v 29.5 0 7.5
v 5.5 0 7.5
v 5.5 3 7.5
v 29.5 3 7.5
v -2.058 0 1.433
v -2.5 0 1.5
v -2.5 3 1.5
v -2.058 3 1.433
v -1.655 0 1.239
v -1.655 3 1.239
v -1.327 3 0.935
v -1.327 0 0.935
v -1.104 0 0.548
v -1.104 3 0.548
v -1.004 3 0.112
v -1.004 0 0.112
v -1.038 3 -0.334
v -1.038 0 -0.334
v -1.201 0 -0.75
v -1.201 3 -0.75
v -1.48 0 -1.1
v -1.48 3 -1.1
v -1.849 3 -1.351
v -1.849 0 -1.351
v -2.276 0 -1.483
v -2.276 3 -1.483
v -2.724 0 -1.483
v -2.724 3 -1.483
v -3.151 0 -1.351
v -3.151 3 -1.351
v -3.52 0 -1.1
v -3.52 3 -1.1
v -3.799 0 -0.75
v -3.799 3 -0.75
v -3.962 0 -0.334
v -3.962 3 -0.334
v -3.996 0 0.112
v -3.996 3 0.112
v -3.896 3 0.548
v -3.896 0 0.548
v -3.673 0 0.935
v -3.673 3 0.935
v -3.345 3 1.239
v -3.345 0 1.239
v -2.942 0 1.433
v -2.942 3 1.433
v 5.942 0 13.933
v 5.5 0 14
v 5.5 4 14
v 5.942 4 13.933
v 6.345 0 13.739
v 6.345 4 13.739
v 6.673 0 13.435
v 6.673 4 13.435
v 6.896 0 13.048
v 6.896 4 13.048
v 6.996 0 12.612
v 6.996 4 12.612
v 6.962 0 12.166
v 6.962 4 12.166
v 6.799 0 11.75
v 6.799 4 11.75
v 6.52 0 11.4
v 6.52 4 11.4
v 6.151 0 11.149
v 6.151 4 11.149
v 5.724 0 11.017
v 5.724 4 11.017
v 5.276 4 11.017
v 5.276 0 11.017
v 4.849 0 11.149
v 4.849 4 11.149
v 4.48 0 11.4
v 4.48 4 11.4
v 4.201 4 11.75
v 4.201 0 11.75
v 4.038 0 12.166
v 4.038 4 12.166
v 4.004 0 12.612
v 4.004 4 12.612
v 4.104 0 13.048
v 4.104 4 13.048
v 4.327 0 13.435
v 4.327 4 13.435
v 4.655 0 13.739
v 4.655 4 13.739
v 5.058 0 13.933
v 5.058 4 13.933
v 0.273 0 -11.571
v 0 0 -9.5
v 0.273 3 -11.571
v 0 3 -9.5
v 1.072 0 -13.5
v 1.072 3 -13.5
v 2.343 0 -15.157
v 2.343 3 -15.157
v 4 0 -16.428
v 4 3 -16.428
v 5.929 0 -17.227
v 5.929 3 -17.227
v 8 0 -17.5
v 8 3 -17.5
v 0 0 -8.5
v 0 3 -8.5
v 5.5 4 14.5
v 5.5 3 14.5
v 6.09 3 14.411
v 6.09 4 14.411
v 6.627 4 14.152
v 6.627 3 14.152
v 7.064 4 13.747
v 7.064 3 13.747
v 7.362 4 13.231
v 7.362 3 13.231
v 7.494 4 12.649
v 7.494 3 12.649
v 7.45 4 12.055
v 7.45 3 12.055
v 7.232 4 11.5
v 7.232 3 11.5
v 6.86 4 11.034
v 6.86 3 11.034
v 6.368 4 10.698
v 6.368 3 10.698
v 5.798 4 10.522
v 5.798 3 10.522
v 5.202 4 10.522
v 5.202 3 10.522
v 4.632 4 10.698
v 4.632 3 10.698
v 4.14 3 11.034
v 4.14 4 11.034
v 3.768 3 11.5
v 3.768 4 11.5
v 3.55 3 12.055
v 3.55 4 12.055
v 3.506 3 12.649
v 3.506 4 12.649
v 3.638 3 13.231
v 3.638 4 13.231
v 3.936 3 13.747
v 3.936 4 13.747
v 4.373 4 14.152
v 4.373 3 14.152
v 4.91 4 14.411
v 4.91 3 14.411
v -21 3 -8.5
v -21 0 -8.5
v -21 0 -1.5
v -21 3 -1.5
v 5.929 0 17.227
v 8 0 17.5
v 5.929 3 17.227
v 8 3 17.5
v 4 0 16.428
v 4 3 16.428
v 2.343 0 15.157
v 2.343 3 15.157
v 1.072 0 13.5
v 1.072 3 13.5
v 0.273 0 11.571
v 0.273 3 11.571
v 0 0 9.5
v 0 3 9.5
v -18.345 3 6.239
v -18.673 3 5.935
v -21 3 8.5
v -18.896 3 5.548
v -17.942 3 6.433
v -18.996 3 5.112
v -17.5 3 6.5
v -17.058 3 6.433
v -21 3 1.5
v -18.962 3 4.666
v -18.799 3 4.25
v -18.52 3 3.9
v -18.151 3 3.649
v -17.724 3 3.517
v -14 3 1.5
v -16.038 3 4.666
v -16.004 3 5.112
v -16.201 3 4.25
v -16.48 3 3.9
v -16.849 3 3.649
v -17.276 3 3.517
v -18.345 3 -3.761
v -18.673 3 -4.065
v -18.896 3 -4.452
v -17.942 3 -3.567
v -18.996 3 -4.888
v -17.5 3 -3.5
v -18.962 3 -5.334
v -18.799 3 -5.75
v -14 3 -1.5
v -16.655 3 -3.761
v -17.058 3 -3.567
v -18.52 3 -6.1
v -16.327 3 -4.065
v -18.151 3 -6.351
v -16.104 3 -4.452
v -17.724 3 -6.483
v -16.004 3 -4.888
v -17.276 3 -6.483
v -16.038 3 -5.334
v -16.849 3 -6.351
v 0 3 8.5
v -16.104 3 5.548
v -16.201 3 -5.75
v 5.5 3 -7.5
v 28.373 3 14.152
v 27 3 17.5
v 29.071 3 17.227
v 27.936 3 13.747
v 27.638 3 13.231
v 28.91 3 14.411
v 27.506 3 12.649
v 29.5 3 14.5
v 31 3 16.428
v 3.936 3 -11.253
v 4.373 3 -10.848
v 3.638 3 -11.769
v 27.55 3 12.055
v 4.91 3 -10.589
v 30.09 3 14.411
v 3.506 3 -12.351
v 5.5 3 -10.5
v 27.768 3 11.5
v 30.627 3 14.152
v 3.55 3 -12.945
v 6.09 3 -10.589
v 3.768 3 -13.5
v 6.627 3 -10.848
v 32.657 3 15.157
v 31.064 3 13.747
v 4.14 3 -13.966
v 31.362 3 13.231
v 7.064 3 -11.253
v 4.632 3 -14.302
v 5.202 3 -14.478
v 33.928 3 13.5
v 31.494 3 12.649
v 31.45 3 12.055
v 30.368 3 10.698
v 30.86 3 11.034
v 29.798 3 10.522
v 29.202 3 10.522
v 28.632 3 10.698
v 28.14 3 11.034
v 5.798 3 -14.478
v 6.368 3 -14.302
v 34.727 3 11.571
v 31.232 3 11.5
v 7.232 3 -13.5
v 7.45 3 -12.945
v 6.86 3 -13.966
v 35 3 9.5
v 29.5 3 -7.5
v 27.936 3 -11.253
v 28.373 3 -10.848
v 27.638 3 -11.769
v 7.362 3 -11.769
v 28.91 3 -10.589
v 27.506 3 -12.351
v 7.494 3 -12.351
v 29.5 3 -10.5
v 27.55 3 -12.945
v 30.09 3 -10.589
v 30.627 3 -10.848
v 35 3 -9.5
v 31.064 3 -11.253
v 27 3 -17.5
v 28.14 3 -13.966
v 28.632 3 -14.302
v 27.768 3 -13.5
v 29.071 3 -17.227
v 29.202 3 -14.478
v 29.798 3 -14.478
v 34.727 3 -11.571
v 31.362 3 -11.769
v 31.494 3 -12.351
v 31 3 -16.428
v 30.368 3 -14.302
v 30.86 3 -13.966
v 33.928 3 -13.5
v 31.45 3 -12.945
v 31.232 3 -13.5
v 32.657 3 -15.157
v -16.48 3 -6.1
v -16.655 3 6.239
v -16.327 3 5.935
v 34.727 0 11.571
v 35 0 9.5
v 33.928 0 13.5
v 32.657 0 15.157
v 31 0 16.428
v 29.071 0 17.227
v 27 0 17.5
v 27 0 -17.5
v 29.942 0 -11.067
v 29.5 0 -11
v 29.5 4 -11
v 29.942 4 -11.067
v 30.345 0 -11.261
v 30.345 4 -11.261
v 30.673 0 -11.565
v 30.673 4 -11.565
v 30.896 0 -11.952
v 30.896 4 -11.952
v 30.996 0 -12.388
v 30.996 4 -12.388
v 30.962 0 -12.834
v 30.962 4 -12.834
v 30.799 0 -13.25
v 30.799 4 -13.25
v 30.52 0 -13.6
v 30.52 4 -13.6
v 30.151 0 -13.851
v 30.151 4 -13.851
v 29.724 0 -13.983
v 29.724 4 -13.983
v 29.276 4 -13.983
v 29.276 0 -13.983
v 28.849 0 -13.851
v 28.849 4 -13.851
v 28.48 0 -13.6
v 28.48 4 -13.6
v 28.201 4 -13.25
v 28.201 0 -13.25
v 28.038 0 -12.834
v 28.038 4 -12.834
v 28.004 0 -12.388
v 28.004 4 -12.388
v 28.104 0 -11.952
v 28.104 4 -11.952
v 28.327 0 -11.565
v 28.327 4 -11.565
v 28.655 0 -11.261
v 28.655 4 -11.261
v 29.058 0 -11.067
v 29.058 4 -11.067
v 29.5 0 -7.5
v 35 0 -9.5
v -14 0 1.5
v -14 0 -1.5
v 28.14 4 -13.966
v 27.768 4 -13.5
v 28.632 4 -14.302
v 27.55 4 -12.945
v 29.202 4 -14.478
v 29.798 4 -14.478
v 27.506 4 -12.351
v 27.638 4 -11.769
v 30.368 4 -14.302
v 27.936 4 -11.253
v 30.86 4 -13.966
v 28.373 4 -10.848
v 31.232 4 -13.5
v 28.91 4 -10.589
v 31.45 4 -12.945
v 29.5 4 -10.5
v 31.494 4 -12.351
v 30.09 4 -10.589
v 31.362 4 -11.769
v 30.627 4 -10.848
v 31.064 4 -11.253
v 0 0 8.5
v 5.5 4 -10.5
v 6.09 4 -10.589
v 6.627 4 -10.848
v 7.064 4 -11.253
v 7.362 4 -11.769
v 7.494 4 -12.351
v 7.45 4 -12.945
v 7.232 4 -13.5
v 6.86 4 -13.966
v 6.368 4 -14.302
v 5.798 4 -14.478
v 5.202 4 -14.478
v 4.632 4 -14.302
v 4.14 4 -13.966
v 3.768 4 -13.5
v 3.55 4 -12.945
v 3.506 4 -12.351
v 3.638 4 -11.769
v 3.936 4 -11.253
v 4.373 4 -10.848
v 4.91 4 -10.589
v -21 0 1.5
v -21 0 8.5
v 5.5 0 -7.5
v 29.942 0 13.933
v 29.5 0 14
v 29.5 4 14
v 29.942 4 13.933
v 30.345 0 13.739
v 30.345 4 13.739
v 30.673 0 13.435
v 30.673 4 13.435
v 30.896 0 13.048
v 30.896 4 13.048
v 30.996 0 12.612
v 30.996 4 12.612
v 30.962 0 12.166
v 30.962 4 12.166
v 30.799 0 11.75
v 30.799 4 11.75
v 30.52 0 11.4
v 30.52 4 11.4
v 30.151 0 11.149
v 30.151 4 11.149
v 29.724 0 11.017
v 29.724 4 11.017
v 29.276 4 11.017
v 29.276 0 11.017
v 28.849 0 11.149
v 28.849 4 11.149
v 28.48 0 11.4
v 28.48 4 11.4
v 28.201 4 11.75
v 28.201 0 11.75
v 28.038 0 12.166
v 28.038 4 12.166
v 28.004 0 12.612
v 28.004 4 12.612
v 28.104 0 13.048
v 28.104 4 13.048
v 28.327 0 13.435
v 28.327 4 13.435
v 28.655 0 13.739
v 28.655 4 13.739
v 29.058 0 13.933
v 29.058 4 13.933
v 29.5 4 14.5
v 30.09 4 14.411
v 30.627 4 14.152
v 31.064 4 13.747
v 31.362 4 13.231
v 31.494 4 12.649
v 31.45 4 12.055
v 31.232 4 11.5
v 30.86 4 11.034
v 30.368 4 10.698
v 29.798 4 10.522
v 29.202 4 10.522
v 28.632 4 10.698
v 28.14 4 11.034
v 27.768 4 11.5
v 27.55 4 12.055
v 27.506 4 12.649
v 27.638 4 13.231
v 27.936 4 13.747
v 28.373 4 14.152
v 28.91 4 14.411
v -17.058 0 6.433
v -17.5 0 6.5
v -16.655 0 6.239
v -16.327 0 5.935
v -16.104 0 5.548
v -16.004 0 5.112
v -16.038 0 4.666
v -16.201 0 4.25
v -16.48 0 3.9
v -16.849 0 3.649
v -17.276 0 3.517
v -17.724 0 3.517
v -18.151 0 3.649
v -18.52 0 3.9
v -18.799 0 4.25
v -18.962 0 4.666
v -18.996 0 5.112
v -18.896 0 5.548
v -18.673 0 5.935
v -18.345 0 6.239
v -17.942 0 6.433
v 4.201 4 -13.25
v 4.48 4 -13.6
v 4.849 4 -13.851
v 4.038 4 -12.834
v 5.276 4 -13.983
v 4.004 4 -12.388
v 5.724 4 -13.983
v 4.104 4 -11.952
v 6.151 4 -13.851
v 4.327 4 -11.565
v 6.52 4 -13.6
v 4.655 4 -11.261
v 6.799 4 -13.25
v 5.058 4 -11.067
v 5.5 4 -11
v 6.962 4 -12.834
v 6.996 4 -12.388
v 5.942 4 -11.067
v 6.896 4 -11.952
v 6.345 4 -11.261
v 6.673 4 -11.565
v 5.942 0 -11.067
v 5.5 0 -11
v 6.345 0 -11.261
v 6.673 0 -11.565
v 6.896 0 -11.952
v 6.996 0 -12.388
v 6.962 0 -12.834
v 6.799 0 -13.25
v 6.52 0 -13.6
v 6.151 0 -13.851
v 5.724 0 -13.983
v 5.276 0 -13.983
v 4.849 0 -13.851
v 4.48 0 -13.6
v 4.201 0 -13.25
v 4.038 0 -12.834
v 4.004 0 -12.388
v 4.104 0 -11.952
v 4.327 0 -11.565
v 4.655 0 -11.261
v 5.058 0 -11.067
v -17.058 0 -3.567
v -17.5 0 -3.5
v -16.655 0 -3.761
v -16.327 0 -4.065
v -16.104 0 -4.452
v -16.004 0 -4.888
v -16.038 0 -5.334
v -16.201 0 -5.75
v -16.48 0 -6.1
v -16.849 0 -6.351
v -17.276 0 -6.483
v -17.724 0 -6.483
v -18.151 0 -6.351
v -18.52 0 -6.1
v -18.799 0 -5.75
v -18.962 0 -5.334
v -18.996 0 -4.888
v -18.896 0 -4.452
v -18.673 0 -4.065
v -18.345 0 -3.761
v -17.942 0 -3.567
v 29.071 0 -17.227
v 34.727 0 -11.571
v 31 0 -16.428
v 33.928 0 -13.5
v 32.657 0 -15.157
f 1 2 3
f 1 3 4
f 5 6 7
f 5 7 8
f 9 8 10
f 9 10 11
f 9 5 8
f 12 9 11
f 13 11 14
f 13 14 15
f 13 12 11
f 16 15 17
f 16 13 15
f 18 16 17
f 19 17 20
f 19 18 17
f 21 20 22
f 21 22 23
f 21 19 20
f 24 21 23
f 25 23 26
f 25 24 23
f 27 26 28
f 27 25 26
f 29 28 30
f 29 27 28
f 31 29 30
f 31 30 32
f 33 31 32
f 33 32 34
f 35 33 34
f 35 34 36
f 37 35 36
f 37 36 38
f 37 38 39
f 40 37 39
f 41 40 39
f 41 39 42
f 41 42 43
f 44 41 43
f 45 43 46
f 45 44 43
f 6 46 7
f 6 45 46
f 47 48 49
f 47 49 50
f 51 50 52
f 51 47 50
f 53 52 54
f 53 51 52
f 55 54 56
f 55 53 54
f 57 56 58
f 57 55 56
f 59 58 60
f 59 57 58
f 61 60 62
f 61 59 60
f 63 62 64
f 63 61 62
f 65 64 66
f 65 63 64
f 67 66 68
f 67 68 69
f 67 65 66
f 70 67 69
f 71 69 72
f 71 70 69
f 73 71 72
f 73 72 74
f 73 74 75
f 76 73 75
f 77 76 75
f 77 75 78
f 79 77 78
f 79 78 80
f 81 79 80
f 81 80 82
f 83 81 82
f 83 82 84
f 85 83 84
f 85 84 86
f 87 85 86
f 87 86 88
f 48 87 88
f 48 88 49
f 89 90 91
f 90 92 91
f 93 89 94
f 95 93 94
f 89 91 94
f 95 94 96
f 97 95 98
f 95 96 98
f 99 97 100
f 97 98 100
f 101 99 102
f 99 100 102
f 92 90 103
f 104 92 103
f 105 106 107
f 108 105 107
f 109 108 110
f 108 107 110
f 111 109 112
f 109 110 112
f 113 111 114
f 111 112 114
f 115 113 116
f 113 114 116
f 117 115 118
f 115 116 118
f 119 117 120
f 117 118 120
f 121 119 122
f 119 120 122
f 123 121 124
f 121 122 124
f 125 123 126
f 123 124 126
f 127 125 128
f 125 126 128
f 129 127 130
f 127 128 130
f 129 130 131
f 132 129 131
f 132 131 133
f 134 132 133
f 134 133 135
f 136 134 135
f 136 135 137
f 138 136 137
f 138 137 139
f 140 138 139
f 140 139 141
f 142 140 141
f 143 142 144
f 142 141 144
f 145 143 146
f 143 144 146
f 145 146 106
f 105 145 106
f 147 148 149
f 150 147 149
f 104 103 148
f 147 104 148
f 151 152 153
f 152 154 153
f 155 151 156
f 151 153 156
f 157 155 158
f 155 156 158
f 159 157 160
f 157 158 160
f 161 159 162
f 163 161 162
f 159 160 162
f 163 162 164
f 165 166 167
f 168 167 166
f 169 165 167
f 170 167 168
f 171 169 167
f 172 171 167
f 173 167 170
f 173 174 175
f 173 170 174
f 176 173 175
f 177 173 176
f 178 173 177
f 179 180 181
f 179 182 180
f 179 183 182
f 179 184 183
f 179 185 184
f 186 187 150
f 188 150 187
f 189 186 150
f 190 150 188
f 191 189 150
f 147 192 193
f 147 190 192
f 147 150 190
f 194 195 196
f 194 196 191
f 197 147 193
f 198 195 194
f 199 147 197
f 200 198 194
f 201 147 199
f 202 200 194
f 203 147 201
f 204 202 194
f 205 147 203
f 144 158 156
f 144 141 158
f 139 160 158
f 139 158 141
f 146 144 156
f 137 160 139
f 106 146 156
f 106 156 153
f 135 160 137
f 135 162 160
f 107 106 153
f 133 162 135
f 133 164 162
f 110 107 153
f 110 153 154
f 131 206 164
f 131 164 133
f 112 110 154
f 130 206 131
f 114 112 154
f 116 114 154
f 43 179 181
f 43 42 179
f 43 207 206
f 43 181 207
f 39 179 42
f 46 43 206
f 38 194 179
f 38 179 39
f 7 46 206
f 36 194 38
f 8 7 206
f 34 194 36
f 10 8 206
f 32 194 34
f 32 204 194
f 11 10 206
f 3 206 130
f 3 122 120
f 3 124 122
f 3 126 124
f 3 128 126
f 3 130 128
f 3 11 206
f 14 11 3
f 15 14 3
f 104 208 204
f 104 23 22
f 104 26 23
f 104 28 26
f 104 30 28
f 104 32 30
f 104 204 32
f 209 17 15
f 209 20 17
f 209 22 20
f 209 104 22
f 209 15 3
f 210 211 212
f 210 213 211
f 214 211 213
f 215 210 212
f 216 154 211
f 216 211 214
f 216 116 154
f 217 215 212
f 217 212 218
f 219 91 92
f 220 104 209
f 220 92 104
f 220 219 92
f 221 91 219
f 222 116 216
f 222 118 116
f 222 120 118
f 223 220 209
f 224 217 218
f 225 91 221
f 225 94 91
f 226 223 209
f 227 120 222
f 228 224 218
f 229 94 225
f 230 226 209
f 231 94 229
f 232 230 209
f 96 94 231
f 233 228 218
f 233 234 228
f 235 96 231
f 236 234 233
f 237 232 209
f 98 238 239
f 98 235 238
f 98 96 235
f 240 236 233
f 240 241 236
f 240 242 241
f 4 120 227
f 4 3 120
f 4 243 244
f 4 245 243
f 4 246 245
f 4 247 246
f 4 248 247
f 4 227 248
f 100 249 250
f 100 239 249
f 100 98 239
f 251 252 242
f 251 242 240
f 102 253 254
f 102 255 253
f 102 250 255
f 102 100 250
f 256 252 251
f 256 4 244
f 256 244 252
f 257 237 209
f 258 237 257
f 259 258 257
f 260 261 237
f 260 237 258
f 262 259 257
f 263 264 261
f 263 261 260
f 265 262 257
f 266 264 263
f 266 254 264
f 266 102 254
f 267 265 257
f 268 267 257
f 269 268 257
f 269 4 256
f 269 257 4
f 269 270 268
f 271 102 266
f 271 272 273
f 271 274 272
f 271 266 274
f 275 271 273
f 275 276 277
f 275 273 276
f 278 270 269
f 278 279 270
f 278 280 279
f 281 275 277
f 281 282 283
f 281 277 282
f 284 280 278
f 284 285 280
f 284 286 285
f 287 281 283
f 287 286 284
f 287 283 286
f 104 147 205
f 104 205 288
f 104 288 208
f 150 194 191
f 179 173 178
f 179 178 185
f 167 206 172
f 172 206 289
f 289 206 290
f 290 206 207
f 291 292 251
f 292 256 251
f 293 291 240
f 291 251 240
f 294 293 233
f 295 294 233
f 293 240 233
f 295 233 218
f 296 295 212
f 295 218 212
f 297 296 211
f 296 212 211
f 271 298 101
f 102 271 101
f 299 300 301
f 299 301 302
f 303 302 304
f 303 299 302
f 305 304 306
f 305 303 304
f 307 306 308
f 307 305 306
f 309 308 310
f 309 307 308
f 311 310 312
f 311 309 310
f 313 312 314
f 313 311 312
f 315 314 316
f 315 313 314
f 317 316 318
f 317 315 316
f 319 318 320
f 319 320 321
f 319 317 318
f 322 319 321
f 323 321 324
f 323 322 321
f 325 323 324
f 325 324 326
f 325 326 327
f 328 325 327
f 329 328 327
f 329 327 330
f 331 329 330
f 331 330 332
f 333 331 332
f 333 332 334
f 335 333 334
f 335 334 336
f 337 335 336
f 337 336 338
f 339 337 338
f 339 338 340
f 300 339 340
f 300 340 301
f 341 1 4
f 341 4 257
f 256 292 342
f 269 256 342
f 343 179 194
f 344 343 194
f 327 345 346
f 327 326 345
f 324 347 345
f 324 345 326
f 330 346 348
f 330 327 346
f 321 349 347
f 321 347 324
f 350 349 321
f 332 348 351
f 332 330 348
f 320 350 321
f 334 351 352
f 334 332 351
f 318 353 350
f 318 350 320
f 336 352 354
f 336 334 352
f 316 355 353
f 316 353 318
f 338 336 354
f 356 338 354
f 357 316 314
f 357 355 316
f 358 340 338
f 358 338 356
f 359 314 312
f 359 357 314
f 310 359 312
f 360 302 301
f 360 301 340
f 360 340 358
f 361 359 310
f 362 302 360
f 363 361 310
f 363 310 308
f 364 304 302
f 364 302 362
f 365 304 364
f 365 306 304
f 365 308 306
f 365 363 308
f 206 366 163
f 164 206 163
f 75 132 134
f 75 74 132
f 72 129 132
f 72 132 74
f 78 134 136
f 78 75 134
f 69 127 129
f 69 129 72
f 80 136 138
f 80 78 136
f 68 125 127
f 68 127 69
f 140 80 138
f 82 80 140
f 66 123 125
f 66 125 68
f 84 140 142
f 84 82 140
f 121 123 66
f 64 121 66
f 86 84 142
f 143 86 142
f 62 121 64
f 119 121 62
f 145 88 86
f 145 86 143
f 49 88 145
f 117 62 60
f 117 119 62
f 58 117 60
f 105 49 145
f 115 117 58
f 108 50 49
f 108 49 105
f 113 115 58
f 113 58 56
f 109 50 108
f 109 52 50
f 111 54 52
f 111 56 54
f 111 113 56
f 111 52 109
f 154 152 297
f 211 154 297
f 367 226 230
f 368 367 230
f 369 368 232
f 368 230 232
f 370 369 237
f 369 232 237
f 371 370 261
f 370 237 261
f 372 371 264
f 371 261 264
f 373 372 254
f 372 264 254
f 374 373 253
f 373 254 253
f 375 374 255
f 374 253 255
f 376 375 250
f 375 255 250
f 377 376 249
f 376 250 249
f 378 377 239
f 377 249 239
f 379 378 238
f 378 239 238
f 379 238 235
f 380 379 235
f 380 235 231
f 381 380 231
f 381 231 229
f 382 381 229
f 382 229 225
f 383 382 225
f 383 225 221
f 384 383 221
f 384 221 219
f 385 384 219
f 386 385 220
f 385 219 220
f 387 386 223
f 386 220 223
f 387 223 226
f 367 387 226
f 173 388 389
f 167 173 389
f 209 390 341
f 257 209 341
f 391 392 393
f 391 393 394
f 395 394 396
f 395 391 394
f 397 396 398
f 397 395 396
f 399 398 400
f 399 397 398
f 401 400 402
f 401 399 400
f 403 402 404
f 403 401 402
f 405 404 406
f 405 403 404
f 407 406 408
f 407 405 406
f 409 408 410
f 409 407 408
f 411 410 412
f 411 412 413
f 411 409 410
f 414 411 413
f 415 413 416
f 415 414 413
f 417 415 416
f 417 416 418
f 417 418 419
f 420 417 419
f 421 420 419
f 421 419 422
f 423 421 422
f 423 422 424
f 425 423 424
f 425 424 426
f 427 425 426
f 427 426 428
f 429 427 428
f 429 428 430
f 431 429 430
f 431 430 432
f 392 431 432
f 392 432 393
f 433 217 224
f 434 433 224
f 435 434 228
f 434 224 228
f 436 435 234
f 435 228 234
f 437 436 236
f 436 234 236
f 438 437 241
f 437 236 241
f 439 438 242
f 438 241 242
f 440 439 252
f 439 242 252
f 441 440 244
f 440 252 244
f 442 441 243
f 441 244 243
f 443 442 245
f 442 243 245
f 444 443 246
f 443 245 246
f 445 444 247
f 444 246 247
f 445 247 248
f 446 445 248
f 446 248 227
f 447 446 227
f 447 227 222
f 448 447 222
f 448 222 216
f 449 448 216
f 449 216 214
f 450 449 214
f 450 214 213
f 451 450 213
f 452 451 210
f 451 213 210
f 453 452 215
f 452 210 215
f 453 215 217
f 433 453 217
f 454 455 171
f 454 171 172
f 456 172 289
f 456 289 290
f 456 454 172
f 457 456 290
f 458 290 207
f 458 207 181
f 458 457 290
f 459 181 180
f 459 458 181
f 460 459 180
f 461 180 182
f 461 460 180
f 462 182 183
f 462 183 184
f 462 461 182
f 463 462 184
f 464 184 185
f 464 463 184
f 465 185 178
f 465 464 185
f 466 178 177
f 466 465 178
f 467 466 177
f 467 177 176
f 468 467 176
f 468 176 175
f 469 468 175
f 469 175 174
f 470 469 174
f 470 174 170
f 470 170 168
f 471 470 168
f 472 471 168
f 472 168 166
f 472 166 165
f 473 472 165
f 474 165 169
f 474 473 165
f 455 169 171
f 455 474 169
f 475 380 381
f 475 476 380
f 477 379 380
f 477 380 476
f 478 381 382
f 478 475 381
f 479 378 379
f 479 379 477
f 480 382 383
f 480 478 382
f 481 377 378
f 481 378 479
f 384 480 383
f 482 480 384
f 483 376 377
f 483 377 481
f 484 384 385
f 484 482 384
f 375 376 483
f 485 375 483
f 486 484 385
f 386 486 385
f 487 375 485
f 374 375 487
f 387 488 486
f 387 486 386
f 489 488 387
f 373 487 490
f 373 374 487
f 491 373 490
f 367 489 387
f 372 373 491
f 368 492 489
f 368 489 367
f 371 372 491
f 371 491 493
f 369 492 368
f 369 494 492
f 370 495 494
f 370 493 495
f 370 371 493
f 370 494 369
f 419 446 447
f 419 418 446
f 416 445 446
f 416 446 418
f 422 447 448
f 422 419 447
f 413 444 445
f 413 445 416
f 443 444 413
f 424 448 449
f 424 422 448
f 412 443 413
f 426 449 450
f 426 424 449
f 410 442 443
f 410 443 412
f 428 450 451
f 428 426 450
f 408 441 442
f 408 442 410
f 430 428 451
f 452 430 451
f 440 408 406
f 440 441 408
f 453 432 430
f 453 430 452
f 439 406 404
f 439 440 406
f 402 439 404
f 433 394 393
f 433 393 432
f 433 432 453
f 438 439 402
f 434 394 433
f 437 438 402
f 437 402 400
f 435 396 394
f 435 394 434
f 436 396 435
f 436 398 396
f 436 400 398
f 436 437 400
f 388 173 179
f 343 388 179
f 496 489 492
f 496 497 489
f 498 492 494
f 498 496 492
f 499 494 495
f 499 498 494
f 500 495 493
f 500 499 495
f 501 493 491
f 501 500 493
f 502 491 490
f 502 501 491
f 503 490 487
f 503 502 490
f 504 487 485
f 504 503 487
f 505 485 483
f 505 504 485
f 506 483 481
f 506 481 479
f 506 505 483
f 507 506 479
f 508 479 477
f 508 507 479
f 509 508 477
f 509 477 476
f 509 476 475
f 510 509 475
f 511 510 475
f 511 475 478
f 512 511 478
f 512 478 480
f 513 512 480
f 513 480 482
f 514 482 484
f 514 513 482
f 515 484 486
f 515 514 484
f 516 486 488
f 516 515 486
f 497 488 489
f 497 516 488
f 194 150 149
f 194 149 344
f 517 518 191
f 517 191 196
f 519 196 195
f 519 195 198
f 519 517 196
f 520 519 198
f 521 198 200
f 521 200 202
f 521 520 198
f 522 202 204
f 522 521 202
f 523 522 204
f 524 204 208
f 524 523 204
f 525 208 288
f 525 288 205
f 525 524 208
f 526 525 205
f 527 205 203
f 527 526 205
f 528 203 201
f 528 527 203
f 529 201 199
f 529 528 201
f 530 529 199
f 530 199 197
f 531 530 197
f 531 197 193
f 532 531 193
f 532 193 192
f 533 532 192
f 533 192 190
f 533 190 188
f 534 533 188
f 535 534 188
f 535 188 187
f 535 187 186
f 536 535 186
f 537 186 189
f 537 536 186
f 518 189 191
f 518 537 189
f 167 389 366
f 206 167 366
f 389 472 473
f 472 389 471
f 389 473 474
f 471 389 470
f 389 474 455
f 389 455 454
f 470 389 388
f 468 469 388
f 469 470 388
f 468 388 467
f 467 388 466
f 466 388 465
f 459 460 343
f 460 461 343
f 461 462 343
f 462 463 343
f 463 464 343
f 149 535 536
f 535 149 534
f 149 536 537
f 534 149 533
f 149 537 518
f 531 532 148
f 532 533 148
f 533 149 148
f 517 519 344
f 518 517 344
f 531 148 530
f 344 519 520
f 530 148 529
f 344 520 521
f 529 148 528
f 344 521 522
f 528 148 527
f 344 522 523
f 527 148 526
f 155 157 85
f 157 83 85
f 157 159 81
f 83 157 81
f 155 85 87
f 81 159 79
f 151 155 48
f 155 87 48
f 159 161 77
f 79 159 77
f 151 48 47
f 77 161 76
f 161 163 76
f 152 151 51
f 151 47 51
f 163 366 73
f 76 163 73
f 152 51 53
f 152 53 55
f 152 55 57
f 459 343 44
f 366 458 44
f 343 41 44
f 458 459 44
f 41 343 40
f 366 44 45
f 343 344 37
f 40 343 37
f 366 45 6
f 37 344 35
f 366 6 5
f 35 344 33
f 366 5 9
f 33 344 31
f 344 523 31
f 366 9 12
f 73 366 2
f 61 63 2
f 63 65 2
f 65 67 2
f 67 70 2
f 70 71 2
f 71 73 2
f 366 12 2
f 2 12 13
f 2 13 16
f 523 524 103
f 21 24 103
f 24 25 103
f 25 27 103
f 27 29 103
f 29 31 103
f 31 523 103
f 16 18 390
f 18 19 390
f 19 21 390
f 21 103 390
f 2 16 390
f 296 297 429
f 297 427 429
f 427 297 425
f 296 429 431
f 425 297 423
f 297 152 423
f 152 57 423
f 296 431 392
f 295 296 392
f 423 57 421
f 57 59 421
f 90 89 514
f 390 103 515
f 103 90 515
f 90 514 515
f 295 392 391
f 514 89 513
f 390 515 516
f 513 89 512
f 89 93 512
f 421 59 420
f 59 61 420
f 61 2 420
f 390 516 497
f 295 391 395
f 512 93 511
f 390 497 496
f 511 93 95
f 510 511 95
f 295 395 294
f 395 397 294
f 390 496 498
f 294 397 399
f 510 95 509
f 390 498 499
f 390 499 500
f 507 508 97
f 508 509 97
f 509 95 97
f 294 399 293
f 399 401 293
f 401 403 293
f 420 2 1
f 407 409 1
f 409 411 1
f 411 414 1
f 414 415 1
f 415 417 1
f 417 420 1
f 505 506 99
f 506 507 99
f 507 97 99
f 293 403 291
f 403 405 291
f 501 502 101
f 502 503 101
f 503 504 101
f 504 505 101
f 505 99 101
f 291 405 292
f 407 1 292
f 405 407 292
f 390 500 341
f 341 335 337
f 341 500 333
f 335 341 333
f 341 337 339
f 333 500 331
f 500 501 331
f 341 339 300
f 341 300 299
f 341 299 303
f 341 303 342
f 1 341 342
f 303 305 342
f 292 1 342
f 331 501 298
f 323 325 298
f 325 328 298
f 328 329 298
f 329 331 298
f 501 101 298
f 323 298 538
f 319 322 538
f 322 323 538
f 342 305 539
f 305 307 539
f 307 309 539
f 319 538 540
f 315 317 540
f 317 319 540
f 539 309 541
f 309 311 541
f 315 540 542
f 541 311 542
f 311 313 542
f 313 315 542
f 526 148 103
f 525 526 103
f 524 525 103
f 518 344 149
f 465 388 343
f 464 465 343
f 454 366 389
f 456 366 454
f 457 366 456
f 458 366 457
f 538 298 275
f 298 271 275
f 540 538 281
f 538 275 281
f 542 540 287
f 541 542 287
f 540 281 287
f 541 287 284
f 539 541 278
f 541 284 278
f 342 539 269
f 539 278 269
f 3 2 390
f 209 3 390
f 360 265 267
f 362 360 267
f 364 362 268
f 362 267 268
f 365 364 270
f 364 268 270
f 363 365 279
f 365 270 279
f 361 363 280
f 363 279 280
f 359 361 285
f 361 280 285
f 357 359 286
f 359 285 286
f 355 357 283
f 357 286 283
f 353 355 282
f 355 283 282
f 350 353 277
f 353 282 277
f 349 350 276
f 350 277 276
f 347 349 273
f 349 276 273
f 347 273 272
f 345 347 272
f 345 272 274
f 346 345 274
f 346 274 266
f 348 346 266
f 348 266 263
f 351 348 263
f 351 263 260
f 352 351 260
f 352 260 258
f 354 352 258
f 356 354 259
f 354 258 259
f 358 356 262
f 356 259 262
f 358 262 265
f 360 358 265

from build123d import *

# Parameters (mm, degrees)
SKETCH_1_R          = 1.5
SKETCH_1_W          = 24
SKETCH_1_H          = 15
EXTRUDE_1_DEPTH     = 3
SKETCH_2_R          = 2
SKETCH_2_R_2        = 1.5
EXTRUDE_2_DEPTH     = 1
CUT_EXTRUDE_1_REACH = 41.246
SKETCH_3_W          = 7
SKETCH_3_H          = 3
FILLET_1_R          = 8


with BuildPart() as part:
    # 草图1 → 凸台-拉伸1 (new body)
    with BuildSketch(Plane(origin=(0, 0, 0), x_dir=(1, 0, 0), z_dir=(0, 1, 0))):
        Polygon((-14, -8.5), (0, -8.5), (0, -17.5), (35, -17.5), (35, 17.5), (0, 17.5), (0, 8.5), (-14, 8.5), (-21, 8.5), (-21, -8.5), align=None)
        with Locations(Location((-2.5, 0, 0), (0, 0, 270))):
            Circle(SKETCH_1_R, mode=Mode.SUBTRACT)
        with Locations(Location((29.5, -12.5, 0), (0, 0, 270))):
            Circle(SKETCH_1_R, mode=Mode.SUBTRACT)
        with Locations(Location((5.5, -12.5, 0), (0, 0, 270))):
            Circle(SKETCH_1_R, mode=Mode.SUBTRACT)
        with Locations(Location((29.5, 12.5, 0), (0, 0, 270))):
            Circle(SKETCH_1_R, mode=Mode.SUBTRACT)
        with Locations(Location((5.5, 12.5, 0), (0, 0, 270))):
            Circle(SKETCH_1_R, mode=Mode.SUBTRACT)
        with Locations(Location((-17.5, -5, 0), (0, 0, 270))):
            Circle(SKETCH_1_R, mode=Mode.SUBTRACT)
        with Locations(Location((-17.5, 5, 0), (0, 0, 270))):
            Circle(SKETCH_1_R, mode=Mode.SUBTRACT)
        with Locations((17.5, 0)):
            Rectangle(SKETCH_1_W, SKETCH_1_H, mode=Mode.SUBTRACT)
    extrude(amount=EXTRUDE_1_DEPTH)

    # 草图2 → 凸台-拉伸2 (add)
    # profile 1 of 4: a face of its own
    with BuildSketch(Plane(origin=(0, 3, 0), x_dir=(1, 0, 0), z_dir=(0, 1, 0))):
        with Locations(Location((5.5, 12.5, 0), (0, 0, 270))):
            Circle(SKETCH_2_R)
        with Locations(Location((5.5, 12.5, 0), (0, 0, 270))):
            Circle(SKETCH_2_R_2, mode=Mode.SUBTRACT)
    # profile 2 of 4: a face of its own
    with BuildSketch(Plane(origin=(0, 3, 0), x_dir=(1, 0, 0), z_dir=(0, 1, 0))):
        with Locations(Location((29.5, 12.5, 0), (0, 0, 270))):
            Circle(SKETCH_2_R)
        with Locations(Location((29.5, 12.5, 0), (0, 0, 270))):
            Circle(SKETCH_2_R_2, mode=Mode.SUBTRACT)
    # profile 3 of 4: a face of its own
    with BuildSketch(Plane(origin=(0, 3, 0), x_dir=(1, 0, 0), z_dir=(0, 1, 0))):
        with Locations(Location((29.5, -12.5, 0), (0, 0, 270))):
            Circle(SKETCH_2_R)
        with Locations(Location((29.5, -12.5, 0), (0, 0, 270))):
            Circle(SKETCH_2_R_2, mode=Mode.SUBTRACT)
    # profile 4 of 4: a face of its own
    with BuildSketch(Plane(origin=(0, 3, 0), x_dir=(1, 0, 0), z_dir=(0, 1, 0))):
        with Locations(Location((5.5, -12.5, 0), (0, 0, 270))):
            Circle(SKETCH_2_R)
        with Locations(Location((5.5, -12.5, 0), (0, 0, 270))):
            Circle(SKETCH_2_R_2, mode=Mode.SUBTRACT)
    extrude(amount=EXTRUDE_2_DEPTH)

    # 草图3 → 切除-拉伸1 (cut, up to next)
    with BuildSketch(Plane(origin=(0, 3, 0), x_dir=(1, 0, 0), z_dir=(0, 1, 0)), mode=Mode.PRIVATE) as cut_extrude_1_sk1:
        with Locations((-17.5, 0)):
            Rectangle(SKETCH_3_W, SKETCH_3_H)
    cut_extrude_1_tool1 = extrude(cut_extrude_1_sk1.sketch, amount=-CUT_EXTRUDE_1_REACH, mode=Mode.PRIVATE) & part.part
    add(cut_extrude_1_tool1.solids().sort_by_distance((-17.5, 3, 0))[0], mode=Mode.SUBTRACT)

    # 圆角1
    fillet_1_edges = [part.edges().sort_by_distance(p)[0] for p in [
        (0, 1.5, -17.5),
        (35, 1.5, -17.5),
        (35, 1.5, 17.5),
        (0, 1.5, 17.5),
    ]]
    fillet(fillet_1_edges, radius=FILLET_1_R)


solid = part.part
